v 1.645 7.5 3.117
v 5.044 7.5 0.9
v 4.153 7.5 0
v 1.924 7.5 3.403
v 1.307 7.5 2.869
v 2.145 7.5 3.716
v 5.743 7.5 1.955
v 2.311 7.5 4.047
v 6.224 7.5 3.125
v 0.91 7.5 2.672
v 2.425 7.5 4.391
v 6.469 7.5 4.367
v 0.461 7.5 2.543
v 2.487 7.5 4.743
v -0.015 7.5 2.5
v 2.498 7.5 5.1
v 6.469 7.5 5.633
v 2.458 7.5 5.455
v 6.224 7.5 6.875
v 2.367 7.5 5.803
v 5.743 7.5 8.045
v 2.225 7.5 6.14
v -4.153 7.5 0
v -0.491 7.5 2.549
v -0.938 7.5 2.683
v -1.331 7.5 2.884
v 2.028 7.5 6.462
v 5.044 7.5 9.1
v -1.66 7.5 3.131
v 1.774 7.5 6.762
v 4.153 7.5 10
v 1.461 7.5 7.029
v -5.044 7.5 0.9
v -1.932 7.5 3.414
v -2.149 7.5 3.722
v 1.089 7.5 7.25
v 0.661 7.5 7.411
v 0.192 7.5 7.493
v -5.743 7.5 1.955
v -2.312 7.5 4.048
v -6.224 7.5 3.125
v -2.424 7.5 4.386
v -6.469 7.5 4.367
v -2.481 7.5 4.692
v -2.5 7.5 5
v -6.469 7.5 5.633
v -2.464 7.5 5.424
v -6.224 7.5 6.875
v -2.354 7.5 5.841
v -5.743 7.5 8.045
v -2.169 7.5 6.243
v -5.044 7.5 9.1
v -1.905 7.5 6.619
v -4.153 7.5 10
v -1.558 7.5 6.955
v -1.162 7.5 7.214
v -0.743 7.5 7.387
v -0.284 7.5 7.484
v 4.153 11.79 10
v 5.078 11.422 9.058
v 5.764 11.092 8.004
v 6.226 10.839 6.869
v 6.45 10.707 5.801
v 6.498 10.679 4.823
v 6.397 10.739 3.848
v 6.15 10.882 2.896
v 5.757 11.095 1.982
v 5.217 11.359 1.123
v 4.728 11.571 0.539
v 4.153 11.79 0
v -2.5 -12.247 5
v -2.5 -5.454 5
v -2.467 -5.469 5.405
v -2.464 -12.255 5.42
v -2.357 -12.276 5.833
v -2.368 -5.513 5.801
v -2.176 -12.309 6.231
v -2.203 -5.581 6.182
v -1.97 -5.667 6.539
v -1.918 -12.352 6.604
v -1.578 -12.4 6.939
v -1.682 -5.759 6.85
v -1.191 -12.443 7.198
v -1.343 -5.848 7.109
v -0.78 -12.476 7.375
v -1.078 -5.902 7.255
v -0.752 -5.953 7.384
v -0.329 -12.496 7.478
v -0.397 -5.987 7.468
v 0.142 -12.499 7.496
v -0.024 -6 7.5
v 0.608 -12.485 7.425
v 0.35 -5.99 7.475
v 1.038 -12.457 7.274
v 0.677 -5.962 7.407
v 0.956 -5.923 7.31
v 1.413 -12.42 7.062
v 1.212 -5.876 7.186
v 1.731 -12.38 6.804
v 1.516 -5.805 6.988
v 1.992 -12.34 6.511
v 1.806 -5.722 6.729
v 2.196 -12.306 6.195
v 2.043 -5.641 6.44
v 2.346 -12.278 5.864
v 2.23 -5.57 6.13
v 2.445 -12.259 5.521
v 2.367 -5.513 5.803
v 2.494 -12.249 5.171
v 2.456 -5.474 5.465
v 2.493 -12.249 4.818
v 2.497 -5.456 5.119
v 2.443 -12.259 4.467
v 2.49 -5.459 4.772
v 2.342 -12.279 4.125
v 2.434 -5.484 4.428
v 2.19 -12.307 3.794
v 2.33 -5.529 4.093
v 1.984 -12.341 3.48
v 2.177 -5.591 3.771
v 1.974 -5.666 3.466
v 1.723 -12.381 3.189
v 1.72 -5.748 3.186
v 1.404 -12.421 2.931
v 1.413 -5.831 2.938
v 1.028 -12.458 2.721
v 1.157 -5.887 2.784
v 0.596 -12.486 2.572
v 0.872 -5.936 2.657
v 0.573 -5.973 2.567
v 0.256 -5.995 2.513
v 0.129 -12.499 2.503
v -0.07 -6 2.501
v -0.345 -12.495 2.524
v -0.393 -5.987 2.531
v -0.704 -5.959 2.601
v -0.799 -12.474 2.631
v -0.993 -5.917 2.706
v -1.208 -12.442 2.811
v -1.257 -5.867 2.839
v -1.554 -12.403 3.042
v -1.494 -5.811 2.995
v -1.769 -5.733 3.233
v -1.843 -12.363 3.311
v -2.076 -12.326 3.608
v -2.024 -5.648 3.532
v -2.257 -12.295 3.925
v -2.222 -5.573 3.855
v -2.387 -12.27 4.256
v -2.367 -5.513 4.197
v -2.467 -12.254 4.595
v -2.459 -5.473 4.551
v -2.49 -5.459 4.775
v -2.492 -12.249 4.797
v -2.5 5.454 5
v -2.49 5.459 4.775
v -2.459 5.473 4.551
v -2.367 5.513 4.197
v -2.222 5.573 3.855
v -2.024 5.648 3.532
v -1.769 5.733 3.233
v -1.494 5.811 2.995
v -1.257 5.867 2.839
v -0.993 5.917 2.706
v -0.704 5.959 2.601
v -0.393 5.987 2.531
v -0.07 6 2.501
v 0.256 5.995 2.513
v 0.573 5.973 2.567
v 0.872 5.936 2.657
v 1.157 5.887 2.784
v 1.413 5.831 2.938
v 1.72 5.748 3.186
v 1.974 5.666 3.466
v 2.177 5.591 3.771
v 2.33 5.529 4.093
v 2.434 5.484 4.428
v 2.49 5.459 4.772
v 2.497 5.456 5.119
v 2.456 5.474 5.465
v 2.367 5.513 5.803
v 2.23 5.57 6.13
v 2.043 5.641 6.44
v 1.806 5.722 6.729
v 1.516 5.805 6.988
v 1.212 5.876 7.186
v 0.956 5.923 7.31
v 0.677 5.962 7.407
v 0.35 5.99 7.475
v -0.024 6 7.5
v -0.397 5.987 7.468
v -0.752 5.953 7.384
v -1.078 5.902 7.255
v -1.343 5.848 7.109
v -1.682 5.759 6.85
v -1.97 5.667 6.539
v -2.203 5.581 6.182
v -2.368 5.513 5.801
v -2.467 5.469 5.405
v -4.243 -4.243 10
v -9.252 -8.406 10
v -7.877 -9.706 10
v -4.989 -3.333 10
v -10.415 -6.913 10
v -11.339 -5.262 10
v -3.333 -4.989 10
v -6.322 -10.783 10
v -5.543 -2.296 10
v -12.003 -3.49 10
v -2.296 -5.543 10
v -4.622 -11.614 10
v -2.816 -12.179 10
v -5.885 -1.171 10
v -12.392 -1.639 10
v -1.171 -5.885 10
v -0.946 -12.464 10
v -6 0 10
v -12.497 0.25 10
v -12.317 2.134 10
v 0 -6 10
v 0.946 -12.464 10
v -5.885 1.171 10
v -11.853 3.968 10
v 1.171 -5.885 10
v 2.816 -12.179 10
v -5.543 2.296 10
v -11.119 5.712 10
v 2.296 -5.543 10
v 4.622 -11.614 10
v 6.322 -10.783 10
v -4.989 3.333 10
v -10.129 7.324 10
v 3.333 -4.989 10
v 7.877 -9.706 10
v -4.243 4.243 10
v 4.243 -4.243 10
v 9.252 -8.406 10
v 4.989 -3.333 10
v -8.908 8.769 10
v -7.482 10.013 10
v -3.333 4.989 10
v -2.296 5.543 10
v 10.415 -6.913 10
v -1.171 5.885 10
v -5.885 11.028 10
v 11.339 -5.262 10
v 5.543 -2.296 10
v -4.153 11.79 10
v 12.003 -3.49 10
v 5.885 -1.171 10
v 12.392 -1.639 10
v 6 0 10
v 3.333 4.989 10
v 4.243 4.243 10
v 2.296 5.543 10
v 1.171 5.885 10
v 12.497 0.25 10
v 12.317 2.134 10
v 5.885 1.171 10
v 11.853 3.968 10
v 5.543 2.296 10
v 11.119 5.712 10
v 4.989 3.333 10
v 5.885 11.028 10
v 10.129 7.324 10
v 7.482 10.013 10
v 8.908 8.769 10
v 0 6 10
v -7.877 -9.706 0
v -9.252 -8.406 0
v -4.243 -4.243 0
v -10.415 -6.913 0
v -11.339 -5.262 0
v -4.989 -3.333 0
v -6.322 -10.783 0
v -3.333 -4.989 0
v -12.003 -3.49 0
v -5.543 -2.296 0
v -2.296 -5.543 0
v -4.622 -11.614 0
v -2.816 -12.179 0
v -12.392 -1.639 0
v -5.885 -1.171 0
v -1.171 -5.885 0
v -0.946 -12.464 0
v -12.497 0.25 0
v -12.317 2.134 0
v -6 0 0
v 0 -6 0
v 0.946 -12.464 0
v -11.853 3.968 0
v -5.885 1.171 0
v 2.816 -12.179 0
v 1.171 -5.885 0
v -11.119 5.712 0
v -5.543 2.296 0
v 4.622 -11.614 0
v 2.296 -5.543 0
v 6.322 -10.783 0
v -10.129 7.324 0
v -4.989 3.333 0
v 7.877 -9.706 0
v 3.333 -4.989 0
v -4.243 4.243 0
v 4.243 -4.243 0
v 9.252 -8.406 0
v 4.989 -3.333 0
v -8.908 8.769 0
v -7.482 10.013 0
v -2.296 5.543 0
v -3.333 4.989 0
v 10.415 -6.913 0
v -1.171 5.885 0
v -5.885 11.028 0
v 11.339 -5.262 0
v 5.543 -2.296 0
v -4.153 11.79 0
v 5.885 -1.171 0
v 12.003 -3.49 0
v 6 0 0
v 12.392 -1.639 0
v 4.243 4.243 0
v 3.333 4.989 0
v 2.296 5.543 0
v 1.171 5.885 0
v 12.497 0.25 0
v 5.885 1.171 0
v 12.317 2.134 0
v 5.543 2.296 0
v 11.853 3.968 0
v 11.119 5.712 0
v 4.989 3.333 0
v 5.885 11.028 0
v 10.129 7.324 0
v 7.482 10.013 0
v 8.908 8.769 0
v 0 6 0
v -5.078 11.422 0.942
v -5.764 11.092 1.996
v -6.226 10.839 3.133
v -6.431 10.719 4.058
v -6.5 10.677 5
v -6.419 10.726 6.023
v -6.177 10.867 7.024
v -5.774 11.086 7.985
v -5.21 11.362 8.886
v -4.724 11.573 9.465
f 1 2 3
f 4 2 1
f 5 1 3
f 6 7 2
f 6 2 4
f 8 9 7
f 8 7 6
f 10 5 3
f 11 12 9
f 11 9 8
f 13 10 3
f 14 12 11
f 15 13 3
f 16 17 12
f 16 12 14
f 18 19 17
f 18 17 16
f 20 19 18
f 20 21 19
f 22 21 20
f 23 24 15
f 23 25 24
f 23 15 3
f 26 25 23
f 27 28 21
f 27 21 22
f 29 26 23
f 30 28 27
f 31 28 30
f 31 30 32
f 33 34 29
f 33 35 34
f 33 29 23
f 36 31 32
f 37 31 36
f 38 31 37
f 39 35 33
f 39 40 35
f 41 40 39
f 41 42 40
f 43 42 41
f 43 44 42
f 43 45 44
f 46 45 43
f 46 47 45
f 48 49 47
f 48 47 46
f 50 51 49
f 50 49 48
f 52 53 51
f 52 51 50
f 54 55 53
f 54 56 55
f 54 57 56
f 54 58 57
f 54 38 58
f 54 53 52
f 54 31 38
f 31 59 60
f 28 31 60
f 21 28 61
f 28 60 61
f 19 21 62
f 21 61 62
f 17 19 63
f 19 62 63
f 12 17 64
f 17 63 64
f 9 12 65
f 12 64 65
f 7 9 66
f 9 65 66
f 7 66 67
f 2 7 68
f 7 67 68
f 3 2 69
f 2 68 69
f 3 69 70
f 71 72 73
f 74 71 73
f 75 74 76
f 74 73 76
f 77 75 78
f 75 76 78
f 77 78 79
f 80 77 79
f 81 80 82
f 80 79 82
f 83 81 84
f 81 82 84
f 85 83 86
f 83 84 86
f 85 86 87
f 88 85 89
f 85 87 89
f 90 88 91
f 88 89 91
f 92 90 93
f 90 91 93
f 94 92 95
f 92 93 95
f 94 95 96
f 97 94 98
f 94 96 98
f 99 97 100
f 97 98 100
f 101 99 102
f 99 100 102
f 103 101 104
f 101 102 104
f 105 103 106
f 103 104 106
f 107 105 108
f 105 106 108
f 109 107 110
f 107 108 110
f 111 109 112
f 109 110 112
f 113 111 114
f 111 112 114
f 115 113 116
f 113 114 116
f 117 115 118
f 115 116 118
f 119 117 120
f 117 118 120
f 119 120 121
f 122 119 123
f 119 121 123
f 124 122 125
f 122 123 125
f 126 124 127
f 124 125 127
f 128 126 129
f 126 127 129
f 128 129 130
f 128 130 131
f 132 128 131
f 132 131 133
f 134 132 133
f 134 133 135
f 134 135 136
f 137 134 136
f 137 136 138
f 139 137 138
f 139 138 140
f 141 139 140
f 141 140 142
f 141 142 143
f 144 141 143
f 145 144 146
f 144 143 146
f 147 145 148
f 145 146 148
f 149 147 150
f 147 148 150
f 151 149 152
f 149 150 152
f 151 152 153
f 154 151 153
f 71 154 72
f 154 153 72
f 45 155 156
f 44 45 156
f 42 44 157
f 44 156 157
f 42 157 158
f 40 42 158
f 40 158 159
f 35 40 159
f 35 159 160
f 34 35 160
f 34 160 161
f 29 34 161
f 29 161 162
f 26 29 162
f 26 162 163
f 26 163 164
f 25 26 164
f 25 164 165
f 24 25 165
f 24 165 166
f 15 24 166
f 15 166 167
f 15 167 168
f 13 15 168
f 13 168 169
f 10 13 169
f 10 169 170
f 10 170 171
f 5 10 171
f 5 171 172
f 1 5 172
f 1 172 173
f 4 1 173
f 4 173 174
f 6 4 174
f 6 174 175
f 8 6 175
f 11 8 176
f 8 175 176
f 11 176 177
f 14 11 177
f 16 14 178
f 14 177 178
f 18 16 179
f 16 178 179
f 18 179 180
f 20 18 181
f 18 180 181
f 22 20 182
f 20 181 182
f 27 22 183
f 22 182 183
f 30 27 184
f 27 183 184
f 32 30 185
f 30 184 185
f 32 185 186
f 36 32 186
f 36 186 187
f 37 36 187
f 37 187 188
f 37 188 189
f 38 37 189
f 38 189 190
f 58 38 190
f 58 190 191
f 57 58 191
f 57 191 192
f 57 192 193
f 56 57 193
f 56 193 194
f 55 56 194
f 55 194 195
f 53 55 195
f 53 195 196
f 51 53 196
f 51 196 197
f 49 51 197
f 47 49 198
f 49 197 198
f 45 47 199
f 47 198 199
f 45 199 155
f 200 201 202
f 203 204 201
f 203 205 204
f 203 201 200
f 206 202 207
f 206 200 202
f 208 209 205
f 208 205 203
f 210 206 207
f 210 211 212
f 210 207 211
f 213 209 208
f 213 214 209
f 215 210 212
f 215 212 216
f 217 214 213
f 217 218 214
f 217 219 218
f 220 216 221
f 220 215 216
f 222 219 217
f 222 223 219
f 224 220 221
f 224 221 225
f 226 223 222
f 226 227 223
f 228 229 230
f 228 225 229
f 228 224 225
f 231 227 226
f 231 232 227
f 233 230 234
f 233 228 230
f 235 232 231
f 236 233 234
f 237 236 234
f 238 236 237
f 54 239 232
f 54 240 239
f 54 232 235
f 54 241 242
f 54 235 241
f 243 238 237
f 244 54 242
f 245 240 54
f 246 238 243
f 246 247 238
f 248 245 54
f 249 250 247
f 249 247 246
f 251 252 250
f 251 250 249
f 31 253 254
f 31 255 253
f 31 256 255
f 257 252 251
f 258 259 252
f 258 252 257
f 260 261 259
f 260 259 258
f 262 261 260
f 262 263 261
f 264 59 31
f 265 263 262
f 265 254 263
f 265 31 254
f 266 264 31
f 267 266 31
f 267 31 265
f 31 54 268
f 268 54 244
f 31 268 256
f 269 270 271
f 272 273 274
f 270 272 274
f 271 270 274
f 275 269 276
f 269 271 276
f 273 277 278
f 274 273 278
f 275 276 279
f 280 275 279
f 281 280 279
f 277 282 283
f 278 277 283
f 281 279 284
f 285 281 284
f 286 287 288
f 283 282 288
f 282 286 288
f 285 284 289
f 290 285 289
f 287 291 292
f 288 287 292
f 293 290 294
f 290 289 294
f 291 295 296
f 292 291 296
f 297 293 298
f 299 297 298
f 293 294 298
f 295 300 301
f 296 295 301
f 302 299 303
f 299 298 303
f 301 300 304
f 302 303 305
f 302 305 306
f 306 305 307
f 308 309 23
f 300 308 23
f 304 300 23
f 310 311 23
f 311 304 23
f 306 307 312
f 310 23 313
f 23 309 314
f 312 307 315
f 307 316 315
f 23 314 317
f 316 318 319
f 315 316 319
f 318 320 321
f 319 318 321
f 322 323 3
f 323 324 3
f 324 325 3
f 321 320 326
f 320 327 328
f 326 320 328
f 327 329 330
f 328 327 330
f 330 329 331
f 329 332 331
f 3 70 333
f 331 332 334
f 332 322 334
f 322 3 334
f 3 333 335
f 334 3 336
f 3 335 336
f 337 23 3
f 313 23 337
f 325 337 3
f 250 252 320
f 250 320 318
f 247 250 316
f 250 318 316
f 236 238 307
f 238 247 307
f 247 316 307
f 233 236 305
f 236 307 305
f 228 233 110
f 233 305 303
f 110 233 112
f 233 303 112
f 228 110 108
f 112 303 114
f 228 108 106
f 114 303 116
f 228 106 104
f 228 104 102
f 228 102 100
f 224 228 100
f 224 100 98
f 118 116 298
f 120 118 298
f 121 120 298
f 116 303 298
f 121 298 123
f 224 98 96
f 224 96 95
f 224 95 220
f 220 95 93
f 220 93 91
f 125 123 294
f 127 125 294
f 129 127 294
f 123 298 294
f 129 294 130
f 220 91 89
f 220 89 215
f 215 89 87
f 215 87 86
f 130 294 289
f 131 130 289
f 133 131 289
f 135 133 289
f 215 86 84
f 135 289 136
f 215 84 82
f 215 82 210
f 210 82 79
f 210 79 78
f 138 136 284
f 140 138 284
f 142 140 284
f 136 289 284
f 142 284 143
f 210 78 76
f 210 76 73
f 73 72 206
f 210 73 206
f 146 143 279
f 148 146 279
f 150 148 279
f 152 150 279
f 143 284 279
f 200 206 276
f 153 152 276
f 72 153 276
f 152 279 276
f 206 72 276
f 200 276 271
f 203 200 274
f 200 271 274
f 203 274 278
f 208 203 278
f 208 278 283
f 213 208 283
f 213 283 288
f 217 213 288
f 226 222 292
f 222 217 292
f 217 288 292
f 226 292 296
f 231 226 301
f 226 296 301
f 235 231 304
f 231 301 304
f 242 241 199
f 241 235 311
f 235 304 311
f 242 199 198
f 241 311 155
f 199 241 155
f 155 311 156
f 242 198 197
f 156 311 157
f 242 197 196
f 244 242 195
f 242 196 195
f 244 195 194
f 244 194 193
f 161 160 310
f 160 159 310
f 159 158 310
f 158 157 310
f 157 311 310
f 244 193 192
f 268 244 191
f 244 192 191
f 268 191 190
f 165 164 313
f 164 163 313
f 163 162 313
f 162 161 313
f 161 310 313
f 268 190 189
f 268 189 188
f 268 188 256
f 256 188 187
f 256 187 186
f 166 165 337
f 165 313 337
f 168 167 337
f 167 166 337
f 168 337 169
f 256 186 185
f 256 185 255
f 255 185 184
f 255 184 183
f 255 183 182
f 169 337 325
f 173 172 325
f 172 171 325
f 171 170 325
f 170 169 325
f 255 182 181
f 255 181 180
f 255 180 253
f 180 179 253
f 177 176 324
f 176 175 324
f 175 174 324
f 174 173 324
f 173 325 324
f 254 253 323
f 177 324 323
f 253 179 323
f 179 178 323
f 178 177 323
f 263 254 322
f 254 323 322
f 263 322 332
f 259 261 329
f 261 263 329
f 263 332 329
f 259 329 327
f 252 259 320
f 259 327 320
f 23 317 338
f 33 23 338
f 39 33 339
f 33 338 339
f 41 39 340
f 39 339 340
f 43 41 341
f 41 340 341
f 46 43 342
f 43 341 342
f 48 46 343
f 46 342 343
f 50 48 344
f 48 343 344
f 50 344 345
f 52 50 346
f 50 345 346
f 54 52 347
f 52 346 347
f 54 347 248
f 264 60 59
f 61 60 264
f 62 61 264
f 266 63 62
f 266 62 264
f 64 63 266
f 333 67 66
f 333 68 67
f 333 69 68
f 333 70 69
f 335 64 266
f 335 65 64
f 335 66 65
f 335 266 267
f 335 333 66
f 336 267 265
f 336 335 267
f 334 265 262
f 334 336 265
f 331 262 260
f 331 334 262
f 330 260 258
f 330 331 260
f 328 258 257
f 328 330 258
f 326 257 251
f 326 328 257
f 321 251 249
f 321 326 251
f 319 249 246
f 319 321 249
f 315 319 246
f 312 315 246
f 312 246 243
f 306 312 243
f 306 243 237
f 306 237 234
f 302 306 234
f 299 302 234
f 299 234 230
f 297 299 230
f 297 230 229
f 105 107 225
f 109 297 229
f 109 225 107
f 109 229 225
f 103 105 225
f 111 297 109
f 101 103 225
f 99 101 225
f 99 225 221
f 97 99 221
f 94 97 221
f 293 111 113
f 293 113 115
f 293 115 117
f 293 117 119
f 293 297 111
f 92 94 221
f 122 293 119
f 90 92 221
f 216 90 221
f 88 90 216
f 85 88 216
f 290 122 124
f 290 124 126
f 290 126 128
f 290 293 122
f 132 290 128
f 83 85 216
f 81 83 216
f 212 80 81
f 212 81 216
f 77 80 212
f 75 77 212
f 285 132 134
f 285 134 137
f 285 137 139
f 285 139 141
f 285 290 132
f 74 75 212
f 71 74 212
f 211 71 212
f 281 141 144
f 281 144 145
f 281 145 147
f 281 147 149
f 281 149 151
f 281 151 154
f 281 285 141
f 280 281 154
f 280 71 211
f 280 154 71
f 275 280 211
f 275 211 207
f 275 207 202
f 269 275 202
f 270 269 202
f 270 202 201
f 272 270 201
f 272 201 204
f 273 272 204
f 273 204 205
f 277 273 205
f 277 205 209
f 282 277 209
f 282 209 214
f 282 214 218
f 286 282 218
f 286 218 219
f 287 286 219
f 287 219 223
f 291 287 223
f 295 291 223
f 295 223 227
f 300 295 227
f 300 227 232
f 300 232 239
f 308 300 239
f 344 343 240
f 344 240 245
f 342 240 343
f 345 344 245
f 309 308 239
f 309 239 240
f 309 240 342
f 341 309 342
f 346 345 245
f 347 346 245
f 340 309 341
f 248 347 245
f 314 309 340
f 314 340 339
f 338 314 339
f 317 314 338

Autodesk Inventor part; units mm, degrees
ref_plane "YZ Plane" through (0, 0, 0) normal (1, 0, 0) x (0, 1, 0)
ref_plane "XY Plane" through (0, 0, 0) normal (0, 0, 1) x (1, 0, 0)
sketch "Sketch1" plane through (0, 0, 0) normal (0, 0, 1) x (1, 0, 0)
  circle A0 centre (0, 0) radius 6
  circle A1 centre (0, 0) radius 12.5
  dimension "d0" = 12
  dimension "d1" = 25
extrude "Extrusion1" add sketch "Sketch1" along normal blind 10
sketch "Sketch2" plane through (0, 0, 0) normal (0, 1, 0) x (-1, 0, 0)
  circle A0 centre (0, 5) radius 2.5
  line L0 (6, 0) -> (6, 10) projected
  point P0 (0, 0)
  point P1 (6, 5)
  dimension "d4" = 5
extrude "Extrusion2" cut sketch "Sketch2" along normal through all both and the other way through all
ref_plane "Work Plane1" through (0, 12.5, 0) normal (0, 1, 0) x (-1, 0, 0)
sketch "Sketch4" plane through (0, 12.5, 0) normal (0, 1, 0) x (-1, 0, 0)
  spline S0 degree 8 poles (2.5, 5) (2.5, 5.2613) (2.4688, 5.5221) (2.4066, 5.7804) (2.3127, 6.0339) (2.1861, 6.2798) (2.0251, 6.5144) (1.828, 6.7323) (1.3947, 7.0908) (1.1606, 7.2449) (0.8947, 7.3748) (0.6036, 7.4701) (0.2962, 7.5238) (-0.0173, 7.5328) (-0.3265, 7.4973) (-0.927, 7.3431) (-1.2062, 7.2245) (-1.4564, 7.0744) (-1.6765, 6.9) (-1.8664, 6.7071) (-2.0266, 6.5008) (-2.1581, 6.2854) (-2.3815, 5.8106) (-2.4663, 5.546) (-2.5169, 5.2746) (-2.5338, 5) (-2.5169, 4.7254) (-2.4663, 4.454) (-2.3815, 4.1894) (-2.1645, 3.7282) (-2.0429, 3.5262) (-1.8964, 3.3322) (-1.7241, 3.1495) (-1.5253, 2.9819) (-1.3, 2.8342) (-1.0485, 2.712) (-0.5121, 2.5377) (-0.2336, 2.4833) (0.0549, 2.4652) (0.3445, 2.486) (0.6257, 2.5448) (0.8897, 2.6372) (1.1293, 2.7558) (1.6409, 3.0804) (1.8944, 3.3103) (2.1007, 3.5658) (2.2623, 3.8384) (2.3815, 4.1219) (2.4604, 4.412) (2.5, 4.7056) (2.5, 5) knots 0 0 0 0 0 0 0 0 0 0.155158 0.155158 0.155158 0.155158 0.155158 0.155158 0.155158 0.286737 0.286737 0.286737 0.286737 0.286737 0.286737 0.286737 0.422792 0.422792 0.422792 0.422792 0.422792 0.422792 0.422792 0.579084 0.579084 0.579084 0.579084 0.579084 0.579084 0.579084 0.706752 0.706752 0.706752 0.706752 0.706752 0.706752 0.706752 0.82726 0.82726 0.82726 0.82726 0.82726 0.82726 0.82726 1 1 1 1 1 1 1 1 1 projected
  circle A0 centre (0, 5) radius 6.5
  point P0 (0, 0)
  dimension "d8" = 13
extrude "Extrusion3" cut sketch "Sketch4" against normal blind 5
properties part number "WA003.ip" material "ABS Plastic"
